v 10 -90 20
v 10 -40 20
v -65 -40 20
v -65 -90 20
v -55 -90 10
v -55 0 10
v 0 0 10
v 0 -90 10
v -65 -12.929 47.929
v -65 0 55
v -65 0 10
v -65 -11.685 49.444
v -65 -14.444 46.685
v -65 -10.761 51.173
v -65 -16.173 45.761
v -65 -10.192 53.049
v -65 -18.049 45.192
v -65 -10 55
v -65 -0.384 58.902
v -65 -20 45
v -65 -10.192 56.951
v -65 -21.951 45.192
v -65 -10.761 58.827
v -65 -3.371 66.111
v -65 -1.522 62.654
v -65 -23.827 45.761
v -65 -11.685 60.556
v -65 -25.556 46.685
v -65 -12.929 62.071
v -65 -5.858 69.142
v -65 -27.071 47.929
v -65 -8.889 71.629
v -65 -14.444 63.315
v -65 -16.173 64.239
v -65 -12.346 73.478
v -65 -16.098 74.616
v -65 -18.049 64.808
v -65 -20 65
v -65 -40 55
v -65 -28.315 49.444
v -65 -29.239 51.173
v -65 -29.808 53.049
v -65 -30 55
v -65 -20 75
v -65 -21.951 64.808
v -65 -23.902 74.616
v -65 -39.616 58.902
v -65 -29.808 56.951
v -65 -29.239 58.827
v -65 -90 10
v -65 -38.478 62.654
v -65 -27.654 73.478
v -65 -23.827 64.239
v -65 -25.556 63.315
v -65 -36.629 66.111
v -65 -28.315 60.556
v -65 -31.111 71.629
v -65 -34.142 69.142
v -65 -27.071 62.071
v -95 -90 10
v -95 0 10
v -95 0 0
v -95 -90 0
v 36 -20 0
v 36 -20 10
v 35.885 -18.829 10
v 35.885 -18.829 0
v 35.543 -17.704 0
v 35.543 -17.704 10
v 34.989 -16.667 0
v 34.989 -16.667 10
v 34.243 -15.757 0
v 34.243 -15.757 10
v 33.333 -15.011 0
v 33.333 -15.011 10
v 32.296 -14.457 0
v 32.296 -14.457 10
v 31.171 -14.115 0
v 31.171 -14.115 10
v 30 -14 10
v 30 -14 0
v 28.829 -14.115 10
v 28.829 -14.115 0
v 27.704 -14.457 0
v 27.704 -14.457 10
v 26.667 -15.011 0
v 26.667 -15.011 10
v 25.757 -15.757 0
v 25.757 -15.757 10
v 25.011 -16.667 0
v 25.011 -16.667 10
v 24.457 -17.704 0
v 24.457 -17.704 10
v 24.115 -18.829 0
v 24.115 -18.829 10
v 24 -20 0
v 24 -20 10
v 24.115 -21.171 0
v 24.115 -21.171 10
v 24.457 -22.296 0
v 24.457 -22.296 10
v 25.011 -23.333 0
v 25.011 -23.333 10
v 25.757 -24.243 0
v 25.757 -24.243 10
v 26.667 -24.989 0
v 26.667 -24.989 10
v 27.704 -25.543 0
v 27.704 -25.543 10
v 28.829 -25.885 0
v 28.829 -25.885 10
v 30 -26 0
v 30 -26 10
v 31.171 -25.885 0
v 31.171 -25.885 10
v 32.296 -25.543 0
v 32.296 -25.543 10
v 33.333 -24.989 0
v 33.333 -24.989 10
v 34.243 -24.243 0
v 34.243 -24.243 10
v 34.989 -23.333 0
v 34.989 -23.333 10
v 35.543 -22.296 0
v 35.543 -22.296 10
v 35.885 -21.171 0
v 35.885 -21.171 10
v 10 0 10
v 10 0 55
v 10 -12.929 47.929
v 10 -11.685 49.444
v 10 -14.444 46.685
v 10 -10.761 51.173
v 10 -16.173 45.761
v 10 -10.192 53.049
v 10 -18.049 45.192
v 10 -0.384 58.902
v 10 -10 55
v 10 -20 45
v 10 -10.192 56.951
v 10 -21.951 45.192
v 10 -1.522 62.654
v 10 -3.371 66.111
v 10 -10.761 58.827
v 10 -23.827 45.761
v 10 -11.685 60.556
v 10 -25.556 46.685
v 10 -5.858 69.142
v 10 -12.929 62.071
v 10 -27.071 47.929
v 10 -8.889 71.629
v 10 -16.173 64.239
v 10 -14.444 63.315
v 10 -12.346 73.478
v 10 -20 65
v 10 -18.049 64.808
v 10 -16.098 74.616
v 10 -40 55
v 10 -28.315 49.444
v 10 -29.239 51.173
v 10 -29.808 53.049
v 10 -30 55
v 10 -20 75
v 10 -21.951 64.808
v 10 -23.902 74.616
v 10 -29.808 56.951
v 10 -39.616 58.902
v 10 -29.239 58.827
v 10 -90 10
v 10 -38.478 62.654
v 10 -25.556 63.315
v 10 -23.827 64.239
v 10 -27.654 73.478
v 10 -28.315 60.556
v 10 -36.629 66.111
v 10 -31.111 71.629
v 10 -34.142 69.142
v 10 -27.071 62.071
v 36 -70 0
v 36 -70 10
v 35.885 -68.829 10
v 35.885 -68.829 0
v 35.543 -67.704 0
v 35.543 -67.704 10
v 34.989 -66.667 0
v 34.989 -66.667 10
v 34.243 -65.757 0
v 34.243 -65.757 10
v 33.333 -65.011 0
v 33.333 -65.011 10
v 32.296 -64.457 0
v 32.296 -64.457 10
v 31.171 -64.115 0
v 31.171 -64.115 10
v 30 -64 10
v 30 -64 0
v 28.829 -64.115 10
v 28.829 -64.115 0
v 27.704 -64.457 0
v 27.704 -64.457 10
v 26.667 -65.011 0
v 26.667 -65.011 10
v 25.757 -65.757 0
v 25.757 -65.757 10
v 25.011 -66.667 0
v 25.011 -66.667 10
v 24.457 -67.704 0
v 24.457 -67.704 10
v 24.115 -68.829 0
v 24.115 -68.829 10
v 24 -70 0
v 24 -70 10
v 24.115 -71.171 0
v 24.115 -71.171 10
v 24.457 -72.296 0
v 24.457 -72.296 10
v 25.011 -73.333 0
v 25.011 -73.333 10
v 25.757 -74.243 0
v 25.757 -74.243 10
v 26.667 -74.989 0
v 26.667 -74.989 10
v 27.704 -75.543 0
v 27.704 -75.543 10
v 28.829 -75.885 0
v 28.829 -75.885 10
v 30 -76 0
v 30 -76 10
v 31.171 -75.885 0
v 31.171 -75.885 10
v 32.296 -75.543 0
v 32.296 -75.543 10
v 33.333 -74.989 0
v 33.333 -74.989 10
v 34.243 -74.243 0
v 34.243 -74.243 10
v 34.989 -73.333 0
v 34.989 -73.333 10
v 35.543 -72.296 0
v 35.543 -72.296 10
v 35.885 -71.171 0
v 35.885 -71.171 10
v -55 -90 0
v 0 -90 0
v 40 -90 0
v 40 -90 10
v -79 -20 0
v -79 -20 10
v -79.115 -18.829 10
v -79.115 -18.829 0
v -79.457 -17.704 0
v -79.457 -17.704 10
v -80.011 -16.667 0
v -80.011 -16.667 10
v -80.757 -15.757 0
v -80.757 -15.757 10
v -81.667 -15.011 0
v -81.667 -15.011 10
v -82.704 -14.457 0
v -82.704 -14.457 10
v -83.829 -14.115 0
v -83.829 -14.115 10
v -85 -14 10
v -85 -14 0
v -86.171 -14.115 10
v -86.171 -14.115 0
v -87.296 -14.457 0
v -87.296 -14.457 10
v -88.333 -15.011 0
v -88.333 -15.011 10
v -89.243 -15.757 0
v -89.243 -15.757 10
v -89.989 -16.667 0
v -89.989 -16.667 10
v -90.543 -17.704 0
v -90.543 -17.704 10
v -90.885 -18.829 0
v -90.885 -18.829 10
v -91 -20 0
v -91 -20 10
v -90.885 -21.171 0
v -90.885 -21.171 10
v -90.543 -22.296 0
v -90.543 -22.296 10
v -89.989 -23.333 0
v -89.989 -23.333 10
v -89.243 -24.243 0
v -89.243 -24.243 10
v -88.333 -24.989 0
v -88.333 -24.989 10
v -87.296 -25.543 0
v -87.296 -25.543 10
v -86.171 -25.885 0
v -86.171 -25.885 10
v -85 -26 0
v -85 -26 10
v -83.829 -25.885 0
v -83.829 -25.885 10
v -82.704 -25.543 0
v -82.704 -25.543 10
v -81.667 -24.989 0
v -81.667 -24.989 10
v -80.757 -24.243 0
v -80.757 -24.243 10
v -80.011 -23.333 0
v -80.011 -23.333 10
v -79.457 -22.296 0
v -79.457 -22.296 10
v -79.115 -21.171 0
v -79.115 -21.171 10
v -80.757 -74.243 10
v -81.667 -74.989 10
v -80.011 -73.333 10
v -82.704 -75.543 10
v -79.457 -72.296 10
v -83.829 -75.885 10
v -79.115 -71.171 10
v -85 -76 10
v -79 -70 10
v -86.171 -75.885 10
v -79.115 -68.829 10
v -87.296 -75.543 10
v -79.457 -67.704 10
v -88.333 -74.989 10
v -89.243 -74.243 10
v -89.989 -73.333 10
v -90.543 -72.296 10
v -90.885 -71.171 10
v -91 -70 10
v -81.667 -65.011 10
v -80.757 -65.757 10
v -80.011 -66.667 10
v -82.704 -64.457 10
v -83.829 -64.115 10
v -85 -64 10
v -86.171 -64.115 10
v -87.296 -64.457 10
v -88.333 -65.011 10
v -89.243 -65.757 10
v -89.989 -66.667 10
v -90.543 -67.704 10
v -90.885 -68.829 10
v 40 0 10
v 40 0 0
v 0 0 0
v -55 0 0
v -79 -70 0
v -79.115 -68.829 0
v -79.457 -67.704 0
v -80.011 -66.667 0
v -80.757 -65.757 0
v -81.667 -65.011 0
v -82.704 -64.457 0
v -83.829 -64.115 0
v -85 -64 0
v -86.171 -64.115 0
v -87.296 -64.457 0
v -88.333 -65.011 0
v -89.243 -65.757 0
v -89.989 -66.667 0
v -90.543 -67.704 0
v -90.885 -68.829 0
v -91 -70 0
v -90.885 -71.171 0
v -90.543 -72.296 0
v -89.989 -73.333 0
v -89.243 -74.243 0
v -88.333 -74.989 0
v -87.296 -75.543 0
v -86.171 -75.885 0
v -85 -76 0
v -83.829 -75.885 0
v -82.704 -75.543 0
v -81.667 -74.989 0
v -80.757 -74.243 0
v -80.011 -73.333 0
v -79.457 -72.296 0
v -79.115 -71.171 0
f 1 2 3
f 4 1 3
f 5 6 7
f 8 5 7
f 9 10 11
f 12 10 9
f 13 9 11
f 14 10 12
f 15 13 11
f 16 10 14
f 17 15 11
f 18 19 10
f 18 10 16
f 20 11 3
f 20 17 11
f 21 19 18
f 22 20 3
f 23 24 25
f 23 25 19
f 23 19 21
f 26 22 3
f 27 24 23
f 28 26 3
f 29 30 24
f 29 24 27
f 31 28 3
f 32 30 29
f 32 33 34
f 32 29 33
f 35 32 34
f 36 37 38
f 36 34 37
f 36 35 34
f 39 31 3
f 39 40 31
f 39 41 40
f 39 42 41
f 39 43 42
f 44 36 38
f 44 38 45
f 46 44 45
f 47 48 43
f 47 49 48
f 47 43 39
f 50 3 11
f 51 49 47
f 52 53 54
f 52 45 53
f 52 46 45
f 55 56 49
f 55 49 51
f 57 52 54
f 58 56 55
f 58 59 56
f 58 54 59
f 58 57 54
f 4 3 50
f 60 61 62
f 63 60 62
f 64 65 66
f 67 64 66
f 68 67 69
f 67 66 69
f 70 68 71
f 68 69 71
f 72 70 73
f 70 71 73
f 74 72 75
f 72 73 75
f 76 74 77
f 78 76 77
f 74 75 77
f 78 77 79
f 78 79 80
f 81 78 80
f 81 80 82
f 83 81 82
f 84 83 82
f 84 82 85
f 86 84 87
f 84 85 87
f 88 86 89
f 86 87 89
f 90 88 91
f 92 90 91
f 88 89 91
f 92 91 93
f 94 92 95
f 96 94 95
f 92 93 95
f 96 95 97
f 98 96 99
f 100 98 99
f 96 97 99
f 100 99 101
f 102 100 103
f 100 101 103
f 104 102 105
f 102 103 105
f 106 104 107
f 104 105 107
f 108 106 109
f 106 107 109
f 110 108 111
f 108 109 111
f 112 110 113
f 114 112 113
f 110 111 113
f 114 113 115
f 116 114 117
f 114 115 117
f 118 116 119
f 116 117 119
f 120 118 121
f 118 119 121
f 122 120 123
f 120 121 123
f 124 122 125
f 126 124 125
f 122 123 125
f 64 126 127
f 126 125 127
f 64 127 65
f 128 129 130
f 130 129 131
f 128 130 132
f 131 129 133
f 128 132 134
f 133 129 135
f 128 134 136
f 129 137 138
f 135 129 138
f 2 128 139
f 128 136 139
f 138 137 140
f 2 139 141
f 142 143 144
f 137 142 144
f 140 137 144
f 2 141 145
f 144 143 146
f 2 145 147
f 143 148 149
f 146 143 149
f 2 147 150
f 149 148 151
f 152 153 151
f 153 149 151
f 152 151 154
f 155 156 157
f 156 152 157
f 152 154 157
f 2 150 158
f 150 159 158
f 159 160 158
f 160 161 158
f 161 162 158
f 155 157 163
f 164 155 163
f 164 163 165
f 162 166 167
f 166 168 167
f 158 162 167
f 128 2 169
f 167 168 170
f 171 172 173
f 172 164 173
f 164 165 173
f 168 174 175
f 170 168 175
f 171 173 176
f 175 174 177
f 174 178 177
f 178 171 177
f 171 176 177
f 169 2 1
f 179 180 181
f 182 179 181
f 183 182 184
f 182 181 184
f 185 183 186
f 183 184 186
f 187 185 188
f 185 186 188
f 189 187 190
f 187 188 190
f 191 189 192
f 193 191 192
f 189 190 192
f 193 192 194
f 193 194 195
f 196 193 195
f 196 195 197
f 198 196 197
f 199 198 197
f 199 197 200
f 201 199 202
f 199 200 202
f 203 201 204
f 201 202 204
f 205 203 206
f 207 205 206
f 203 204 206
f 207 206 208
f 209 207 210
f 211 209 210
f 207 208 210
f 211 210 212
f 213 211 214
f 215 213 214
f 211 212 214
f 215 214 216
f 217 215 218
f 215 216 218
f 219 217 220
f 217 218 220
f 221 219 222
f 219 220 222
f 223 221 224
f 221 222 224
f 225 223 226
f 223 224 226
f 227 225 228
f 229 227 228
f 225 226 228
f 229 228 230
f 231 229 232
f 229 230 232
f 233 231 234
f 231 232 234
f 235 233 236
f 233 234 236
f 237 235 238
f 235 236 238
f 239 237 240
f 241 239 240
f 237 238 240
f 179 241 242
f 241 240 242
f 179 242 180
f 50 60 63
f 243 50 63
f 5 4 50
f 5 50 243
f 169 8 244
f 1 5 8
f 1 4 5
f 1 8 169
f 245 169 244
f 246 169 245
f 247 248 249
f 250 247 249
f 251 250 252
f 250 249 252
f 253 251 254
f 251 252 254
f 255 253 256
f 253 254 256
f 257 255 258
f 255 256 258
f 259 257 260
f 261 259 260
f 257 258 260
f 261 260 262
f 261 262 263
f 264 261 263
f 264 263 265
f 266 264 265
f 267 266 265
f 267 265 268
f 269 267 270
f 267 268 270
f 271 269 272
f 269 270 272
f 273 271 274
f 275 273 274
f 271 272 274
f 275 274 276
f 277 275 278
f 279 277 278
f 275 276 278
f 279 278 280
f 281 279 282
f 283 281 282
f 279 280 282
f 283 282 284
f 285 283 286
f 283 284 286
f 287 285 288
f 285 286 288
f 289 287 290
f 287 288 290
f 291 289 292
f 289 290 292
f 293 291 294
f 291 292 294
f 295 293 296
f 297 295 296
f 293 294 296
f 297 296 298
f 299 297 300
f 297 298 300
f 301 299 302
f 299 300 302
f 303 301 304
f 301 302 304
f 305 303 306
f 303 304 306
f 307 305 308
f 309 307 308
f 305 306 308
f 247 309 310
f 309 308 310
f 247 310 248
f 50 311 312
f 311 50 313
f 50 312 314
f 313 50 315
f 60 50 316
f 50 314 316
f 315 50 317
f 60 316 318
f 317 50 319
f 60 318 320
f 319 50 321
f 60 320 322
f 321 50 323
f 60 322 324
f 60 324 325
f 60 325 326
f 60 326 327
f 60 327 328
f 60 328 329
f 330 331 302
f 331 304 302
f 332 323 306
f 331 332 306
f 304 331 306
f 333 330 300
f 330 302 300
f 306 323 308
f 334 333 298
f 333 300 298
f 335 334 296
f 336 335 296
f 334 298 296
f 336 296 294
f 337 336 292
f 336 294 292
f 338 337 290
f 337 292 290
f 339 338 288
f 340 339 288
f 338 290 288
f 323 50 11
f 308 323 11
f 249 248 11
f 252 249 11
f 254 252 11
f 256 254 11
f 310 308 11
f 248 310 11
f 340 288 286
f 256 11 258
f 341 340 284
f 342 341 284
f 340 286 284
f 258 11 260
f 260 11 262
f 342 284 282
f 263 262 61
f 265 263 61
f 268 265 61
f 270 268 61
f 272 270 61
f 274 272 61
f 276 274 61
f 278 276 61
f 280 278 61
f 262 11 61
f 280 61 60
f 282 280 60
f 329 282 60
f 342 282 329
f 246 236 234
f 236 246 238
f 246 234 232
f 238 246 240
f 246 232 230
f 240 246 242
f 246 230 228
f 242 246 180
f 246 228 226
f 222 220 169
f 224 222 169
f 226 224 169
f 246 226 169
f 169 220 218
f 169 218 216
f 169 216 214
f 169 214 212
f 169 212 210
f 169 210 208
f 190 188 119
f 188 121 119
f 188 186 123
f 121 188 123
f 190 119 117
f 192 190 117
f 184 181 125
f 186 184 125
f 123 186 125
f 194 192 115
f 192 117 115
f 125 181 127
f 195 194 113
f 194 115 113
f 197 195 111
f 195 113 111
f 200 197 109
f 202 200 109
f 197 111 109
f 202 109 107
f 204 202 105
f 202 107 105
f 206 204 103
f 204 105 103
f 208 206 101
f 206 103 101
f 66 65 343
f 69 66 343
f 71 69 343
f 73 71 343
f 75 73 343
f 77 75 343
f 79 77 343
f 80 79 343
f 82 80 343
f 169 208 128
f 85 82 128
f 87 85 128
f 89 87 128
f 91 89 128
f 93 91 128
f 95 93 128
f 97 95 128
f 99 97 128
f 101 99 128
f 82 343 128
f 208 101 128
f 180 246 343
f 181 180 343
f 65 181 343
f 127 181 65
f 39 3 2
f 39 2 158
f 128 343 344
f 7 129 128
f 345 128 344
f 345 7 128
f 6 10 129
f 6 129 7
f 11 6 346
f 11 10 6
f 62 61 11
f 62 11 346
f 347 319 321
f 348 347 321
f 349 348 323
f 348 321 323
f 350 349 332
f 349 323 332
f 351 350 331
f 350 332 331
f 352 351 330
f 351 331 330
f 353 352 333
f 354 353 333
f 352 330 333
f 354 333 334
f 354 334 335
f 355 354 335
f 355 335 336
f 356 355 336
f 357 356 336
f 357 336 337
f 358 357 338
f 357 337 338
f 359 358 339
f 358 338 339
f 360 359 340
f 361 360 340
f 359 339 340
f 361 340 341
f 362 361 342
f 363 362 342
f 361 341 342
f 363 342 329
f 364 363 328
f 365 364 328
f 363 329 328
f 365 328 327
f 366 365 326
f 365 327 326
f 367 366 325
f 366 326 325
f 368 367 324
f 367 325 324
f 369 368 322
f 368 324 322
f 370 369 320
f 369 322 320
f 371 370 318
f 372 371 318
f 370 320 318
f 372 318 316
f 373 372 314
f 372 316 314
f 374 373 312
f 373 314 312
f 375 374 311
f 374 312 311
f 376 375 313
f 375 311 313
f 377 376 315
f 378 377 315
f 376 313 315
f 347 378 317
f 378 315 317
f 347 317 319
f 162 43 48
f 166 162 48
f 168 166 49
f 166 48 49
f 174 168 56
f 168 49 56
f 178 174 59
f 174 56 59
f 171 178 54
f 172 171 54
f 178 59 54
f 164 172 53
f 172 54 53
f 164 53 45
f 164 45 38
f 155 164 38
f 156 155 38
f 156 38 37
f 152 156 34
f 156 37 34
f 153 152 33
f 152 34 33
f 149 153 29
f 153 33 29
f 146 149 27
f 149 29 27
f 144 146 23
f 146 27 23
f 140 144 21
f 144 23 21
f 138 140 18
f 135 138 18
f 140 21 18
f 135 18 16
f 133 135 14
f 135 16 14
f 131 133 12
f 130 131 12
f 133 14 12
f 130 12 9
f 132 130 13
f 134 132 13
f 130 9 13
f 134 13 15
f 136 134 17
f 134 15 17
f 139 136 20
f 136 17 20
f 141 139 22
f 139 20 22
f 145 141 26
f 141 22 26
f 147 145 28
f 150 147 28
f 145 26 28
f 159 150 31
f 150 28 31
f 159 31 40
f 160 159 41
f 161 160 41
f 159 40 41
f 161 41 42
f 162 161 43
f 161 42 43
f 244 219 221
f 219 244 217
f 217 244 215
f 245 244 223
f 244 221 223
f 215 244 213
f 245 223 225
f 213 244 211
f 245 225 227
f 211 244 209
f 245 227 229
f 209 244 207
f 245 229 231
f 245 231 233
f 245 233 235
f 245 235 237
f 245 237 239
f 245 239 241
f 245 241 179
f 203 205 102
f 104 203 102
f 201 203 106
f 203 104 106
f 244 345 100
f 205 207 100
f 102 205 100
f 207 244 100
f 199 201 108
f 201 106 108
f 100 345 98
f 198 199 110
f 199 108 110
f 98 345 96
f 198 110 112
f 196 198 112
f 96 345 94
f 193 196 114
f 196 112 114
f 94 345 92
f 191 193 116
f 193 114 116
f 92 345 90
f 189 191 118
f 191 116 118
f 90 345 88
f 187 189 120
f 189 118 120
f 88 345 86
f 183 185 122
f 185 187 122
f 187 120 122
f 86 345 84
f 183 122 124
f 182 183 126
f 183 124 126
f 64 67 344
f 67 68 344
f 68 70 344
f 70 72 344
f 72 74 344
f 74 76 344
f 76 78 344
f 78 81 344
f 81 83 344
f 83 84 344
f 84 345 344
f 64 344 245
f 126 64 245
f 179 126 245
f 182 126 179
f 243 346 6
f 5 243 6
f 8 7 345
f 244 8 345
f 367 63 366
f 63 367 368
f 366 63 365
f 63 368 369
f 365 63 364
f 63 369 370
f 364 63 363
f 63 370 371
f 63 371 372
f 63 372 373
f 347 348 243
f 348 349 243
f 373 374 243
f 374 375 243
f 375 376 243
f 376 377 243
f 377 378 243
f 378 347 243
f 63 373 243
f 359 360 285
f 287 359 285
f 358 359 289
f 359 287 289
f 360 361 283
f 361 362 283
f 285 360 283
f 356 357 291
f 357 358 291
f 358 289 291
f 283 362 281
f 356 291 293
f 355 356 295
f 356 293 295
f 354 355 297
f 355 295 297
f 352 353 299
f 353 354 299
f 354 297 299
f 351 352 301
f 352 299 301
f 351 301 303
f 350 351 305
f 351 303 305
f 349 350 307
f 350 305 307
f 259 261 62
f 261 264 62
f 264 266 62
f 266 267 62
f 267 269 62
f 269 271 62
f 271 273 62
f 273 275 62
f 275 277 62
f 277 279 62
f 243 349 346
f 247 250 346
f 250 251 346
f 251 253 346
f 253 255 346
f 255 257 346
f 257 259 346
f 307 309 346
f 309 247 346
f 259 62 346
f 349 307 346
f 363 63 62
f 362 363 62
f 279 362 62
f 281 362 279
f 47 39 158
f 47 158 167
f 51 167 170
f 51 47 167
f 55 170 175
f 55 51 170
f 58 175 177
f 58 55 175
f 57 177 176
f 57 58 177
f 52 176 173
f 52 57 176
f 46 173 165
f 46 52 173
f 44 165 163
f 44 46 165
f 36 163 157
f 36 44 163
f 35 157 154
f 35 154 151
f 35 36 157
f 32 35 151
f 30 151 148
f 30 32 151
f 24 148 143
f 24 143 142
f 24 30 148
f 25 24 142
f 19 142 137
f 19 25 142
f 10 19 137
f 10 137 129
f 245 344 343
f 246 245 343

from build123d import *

# Parameters (mm, degrees)
F1_DEPTH  = 90
F2_R      = 6
F3_DEPTH  = 10
F4_R      = 6
F5_DEPTH  = 10
F6_R      = 6
F8_DEPTH  = 10
F7_R      = 6
F9_DEPTH  = 10
F10_R     = 10
F11_DEPTH = 75


with BuildPart() as f1:
    # F0 (on Front) → F1 (new body)
    with BuildSketch(Plane.XZ):
        Polygon((-95, 10), (-95, 0), (-55, 0), (-55, 10), (0, 10), (0, 0), (40, 0), (40, 10), (10, 10), (10, 20), (-65, 20), (-65, 10), align=None)
    extrude(amount=F1_DEPTH)

    # F2 (on face) → F3 (cut)
    with BuildSketch(Plane.XY.offset(10)):
        with Locations((-85, -70)):
            Circle(F2_R)
    extrude(amount=-F3_DEPTH, mode=Mode.SUBTRACT)

    # F4 (on face) → F5 (cut)
    with BuildSketch(Plane.XY.offset(10)):
        with Locations((30, -70)):
            Circle(F4_R)
    extrude(amount=-F5_DEPTH, mode=Mode.SUBTRACT)

    # F6 (on face) → F8 (cut)
    with BuildSketch(Plane.XY.offset(10)):
        with Locations((-85, -20)):
            Circle(F6_R)
    extrude(amount=-F8_DEPTH, mode=Mode.SUBTRACT)

    # F7 (on face) → F9 (cut)
    with BuildSketch(Plane.XY.offset(10)):
        with Locations((30, -20)):
            Circle(F7_R)
    extrude(amount=-F9_DEPTH, mode=Mode.SUBTRACT)

    # F10 (on face) → F11 (join, through all)
    with BuildSketch(Plane(origin=(-65, 0, 0), x_dir=(0, -1, 0), z_dir=(-1, 0, 0))):
        with BuildLine():
            Line((0, 55), (0, 20))
            Line((0, 20), (40, 20))
            Line((40, 20), (40, 55))
            ThreePointArc((40, 55), (20, 75), (0, 55))
        make_face()
        with Locations((20, 55)):
            Circle(F10_R, mode=Mode.SUBTRACT)
    extrude(amount=-F11_DEPTH)


solid = f1.part
